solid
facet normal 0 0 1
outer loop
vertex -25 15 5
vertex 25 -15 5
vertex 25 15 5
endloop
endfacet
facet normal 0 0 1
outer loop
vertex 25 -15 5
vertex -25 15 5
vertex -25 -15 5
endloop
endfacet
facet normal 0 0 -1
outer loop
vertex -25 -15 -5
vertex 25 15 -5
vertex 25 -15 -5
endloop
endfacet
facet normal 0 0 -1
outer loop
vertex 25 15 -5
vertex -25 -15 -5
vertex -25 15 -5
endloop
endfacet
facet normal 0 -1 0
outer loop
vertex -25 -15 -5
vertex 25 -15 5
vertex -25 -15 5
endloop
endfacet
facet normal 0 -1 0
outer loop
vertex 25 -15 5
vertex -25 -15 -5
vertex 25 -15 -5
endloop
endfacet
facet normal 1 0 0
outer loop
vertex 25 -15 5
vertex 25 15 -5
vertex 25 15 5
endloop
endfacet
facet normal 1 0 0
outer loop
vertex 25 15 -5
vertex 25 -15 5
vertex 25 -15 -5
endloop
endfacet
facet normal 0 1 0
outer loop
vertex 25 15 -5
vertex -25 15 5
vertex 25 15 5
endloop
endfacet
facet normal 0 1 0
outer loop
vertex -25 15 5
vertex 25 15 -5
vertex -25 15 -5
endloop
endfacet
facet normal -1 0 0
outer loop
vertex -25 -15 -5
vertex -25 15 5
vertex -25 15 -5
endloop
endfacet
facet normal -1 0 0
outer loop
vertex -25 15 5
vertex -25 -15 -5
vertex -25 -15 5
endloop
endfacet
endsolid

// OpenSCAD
// Parameters
body_length = 50; //[25:100:1]
body_width  = 30; //[15:60:1]
body_height = 10; //[5:20:1]

$fn = 64;

// Main Body (single connected solid)
module main_body() {
  // Ensure non-zero, valid dimensions to avoid empty/blank renders
  L = max(body_length, 0.1);
  W = max(body_width,  0.1);
  H = max(body_height, 0.1);

  color([0.85, 0.85, 0.8])
    cube([L, W, H], center=true);
}

// Final Model
main_body();
